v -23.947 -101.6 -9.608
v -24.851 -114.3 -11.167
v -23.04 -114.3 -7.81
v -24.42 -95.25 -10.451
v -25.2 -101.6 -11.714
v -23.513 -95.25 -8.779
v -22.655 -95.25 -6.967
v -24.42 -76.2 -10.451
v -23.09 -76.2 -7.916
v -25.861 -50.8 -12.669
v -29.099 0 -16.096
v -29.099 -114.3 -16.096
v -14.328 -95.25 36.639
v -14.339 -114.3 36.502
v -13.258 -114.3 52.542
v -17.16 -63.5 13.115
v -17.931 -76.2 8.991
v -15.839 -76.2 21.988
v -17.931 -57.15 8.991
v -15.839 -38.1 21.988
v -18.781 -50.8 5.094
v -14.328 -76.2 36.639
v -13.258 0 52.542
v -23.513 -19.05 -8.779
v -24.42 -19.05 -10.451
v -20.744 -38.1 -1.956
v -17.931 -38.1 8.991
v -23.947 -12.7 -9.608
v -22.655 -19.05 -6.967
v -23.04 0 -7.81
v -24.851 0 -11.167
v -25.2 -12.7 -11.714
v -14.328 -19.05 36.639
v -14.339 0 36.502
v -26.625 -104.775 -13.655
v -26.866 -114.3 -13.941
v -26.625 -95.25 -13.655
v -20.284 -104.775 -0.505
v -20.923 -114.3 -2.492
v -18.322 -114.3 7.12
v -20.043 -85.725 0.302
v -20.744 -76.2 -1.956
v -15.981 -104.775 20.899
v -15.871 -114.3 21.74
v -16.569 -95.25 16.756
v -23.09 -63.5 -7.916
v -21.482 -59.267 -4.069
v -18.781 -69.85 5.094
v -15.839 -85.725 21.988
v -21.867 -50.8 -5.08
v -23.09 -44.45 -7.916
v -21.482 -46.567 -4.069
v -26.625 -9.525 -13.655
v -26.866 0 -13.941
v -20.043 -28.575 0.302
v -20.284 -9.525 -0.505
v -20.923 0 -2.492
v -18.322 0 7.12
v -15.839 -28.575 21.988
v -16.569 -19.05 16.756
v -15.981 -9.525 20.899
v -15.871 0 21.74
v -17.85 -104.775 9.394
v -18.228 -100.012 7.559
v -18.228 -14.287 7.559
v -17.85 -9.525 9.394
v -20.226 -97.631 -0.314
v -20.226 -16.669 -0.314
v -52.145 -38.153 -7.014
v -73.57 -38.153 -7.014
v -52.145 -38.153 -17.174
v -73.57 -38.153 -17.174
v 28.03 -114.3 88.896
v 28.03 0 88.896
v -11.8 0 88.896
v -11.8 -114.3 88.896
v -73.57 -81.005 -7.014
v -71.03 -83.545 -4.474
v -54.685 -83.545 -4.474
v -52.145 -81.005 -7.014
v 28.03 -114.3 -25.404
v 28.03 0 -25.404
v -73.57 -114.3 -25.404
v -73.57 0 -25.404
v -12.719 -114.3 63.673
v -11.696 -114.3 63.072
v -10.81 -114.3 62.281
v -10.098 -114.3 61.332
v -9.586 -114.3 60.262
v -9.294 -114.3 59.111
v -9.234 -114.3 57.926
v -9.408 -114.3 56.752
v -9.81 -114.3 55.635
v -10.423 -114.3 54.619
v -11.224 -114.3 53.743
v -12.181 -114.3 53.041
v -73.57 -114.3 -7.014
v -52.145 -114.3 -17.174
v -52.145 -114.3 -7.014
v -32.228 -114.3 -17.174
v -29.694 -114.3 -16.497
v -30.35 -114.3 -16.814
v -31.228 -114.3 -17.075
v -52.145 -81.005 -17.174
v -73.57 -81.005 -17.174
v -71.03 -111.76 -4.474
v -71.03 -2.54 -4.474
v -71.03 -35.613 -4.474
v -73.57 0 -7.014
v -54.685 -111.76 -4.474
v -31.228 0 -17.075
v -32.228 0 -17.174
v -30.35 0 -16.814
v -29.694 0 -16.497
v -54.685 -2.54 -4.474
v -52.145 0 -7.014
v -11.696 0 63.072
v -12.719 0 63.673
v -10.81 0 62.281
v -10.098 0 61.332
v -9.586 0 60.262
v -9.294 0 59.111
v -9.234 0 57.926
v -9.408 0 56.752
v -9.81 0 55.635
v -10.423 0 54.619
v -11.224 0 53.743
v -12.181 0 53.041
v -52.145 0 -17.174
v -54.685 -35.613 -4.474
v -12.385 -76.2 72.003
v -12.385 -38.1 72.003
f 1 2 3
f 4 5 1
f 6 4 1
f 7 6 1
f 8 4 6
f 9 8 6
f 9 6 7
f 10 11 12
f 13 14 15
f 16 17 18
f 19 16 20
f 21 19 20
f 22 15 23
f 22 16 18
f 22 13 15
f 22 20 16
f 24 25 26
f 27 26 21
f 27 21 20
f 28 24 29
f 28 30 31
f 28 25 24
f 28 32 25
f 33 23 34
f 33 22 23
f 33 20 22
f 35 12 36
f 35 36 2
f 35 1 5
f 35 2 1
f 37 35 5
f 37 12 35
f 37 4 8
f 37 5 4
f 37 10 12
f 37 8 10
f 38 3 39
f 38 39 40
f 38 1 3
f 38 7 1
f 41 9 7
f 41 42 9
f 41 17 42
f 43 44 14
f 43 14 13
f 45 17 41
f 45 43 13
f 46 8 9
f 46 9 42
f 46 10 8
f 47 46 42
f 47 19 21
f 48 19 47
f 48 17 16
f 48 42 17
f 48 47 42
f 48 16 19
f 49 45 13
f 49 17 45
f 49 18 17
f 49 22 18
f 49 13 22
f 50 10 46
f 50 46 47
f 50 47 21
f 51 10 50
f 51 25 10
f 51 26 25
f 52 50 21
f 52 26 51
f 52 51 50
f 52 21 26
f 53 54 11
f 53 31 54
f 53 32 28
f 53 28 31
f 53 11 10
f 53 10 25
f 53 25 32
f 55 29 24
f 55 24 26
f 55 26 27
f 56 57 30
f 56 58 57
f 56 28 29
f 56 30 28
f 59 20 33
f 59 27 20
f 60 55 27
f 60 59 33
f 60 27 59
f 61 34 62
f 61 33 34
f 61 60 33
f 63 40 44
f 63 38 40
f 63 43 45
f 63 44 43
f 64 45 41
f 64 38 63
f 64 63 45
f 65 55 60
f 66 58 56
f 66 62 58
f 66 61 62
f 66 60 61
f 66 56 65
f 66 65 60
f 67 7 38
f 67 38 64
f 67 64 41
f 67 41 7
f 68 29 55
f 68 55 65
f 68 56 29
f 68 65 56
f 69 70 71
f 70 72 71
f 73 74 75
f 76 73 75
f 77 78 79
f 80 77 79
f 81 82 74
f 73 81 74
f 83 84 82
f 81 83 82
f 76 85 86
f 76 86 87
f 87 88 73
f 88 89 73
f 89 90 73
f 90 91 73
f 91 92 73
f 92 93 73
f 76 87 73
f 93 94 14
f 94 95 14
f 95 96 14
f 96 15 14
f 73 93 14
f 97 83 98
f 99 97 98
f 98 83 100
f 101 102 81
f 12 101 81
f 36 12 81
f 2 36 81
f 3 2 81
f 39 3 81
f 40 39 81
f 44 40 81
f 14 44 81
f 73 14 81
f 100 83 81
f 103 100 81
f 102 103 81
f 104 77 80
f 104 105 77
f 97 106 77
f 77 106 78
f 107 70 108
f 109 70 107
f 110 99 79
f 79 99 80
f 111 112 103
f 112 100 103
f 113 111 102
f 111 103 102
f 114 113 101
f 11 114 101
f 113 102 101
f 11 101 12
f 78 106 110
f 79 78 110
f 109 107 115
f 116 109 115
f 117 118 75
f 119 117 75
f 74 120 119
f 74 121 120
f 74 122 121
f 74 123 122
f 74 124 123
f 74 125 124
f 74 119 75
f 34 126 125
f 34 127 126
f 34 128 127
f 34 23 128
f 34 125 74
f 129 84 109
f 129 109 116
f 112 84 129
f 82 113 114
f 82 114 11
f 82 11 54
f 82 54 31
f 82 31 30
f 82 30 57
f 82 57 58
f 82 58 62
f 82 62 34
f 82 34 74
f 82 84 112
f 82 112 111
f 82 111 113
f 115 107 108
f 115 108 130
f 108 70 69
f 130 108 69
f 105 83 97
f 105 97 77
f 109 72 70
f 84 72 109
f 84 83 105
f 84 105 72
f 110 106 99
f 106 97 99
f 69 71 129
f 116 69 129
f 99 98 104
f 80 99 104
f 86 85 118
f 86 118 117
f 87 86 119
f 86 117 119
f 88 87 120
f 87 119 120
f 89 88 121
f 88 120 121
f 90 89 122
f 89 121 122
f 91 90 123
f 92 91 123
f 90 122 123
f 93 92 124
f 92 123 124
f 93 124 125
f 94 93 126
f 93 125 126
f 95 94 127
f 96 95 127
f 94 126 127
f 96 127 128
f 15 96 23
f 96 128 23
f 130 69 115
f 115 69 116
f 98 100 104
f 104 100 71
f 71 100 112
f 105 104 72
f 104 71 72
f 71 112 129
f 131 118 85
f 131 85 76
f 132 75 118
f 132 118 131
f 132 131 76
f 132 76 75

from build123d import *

# Parameters (mm, degrees)
F7_DEPTH = 114.3
F0_W     = 21.425565113
F0_H     = 33.2948663116
F8_DEPTH = 12.7
F0_H_2   = 38.15253824
F9_DEPTH = 12.7
F10_SIZE = 2.54
F1_SIZE  = 2.54
F11_SIZE = 2.54
F2_SIZE  = 2.54
F12_SIZE = 2.54
F3_SIZE  = 2.54
F4_SIZE  = 2.54
F13_R    = 5.08


# Not quite as in the source:
# - a feature of the source that left no trace in its solid (it failed there, or was rolled back) is left out


with BuildPart() as f7:
    # F6 (on Front) → F7 (new body)
    with BuildSketch(Plane.XZ):
        with BuildLine():
            Line((28.0298027718, 88.895993849), (-11.7995445112, 88.895993849))
            add(Edge.make_bspline(
                [(-12.7191172273, 63.6731384112), (-12.3630729131, 71.9399928392), (-12.0813087773, 80.417993931), (-11.7995445112, 88.895993849)],
                knots=[0.894750445, 0.894750445, 0.894750445, 0.894750445, 1, 1, 1, 1], degree=3))
            ThreePointArc((-12.7191172273, 63.6731384112), (-9.233937312, 57.9257119158), (-13.2581382148, 52.5419216657))
            add(Edge.make_bspline(
                [(-30.7190670022, -17.1741323863), (-19.0091812538, -10.6770336575), (-15.1403430342, 18.1088676273), (-13.2581382148, 52.5419216657)],
                knots=[0.3956141416, 0.3956141416, 0.3956141416, 0.3956141416, 0.846870688, 0.846870688, 0.846870688, 0.846870688], degree=3))
            add(Edge.make_bspline(
                [(-44.7375965866, -17.1741323863), (-39.4125863388, -19.0279691828), (-34.6287794117, -19.3433924519), (-30.7190670022, -17.1741323863)],
                knots=[0.2449479988, 0.2449479988, 0.2449479988, 0.2449479988, 0.3956141416, 0.3956141416, 0.3956141416, 0.3956141416], degree=3))
            Line((-44.7375965866, -17.1741323863), (-49.7875006466, -17.1741323863))
            Line((-49.7875006466, -17.1741323863), (-73.5701972282, -17.1741323863))
            Line((-73.5701972282, -17.1741323863), (-73.5701972282, -25.404006151))
            Line((-73.5701972282, -25.404006151), (28.0298027718, -25.404006151))
            Line((28.0298027718, -25.404006151), (28.0298027718, 88.895993849))
        make_face()
        with BuildLine():
            add(Edge.make_bspline(
                [(-44.7375965866, -17.1741323863), (-39.4125863388, -19.0279691828), (-34.6287794117, -19.3433924519), (-30.7190670022, -17.1741323863)],
                knots=[0.2449479988, 0.2449479988, 0.2449479988, 0.2449479988, 0.3956141416, 0.3956141416, 0.3956141416, 0.3956141416], degree=3))
            Line((-30.7190670022, -17.1741323863), (-44.7375965866, -17.1741323863))
        make_face()
    extrude(amount=F7_DEPTH)

    # F0 (on face) → F8 (join)
    with BuildSketch(Plane.XY.offset(-17.1741323863)):
        with Locations((-62.8574146717, -97.6525668442)):
            Rectangle(F0_W, F0_H)
    extrude(amount=F8_DEPTH)

    # F0 (on face) → F9 (join)
    with BuildSketch(Plane.XY.offset(-17.1741323863)):
        with Locations((-62.8574146717, -19.07626912)):
            Rectangle(F0_W, F0_H_2)
    extrude(amount=F9_DEPTH)

    # F10
    f10_edges = [f7.edges().sort_by_distance(p)[0] for p in [
        (-62.857415, 0, -4.474132),
    ]]
    chamfer(f10_edges, length=F10_SIZE)

    # F1
    f1_edges = [f7.edges().sort_by_distance(p)[0] for p in [
        (-52.144632, -20.346269, -4.474132),
        (-52.144632, -97.652567, -4.474132),
    ]]
    chamfer(f1_edges, length=F1_SIZE)

    # F11
    f11_edges = [f7.edges().sort_by_distance(p)[0] for p in [
        (-73.570197, -20.346269, -4.474132),
    ]]
    chamfer(f11_edges, length=F11_SIZE)

    # F2
    f2_edges = [f7.edges().sort_by_distance(p)[0] for p in [
        (-62.857415, -38.152538, -4.474132),
    ]]
    chamfer(f2_edges, length=F2_SIZE)

    # F12
    f12_edges = [f7.edges().sort_by_distance(p)[0] for p in [
        (-64.127415, -114.3, -4.474132),
    ]]
    chamfer(f12_edges, length=F12_SIZE)

    # F3
    f3_edges = [f7.edges().sort_by_distance(p)[0] for p in [
        (-73.570197, -96.382567, -4.474132),
    ]]
    chamfer(f3_edges, length=F3_SIZE)

    # F4
    f4_edges = [f7.edges().sort_by_distance(p)[0] for p in [
        (-62.857415, -81.005134, -4.474132),
    ]]
    chamfer(f4_edges, length=F4_SIZE)

    # F13
    f13_edges = [f7.edges().sort_by_distance(p)[0] for p in [
        (-30.719067, -57.15, -17.174132),
    ]]
    fillet(f13_edges, radius=F13_R)


solid = f7.part
